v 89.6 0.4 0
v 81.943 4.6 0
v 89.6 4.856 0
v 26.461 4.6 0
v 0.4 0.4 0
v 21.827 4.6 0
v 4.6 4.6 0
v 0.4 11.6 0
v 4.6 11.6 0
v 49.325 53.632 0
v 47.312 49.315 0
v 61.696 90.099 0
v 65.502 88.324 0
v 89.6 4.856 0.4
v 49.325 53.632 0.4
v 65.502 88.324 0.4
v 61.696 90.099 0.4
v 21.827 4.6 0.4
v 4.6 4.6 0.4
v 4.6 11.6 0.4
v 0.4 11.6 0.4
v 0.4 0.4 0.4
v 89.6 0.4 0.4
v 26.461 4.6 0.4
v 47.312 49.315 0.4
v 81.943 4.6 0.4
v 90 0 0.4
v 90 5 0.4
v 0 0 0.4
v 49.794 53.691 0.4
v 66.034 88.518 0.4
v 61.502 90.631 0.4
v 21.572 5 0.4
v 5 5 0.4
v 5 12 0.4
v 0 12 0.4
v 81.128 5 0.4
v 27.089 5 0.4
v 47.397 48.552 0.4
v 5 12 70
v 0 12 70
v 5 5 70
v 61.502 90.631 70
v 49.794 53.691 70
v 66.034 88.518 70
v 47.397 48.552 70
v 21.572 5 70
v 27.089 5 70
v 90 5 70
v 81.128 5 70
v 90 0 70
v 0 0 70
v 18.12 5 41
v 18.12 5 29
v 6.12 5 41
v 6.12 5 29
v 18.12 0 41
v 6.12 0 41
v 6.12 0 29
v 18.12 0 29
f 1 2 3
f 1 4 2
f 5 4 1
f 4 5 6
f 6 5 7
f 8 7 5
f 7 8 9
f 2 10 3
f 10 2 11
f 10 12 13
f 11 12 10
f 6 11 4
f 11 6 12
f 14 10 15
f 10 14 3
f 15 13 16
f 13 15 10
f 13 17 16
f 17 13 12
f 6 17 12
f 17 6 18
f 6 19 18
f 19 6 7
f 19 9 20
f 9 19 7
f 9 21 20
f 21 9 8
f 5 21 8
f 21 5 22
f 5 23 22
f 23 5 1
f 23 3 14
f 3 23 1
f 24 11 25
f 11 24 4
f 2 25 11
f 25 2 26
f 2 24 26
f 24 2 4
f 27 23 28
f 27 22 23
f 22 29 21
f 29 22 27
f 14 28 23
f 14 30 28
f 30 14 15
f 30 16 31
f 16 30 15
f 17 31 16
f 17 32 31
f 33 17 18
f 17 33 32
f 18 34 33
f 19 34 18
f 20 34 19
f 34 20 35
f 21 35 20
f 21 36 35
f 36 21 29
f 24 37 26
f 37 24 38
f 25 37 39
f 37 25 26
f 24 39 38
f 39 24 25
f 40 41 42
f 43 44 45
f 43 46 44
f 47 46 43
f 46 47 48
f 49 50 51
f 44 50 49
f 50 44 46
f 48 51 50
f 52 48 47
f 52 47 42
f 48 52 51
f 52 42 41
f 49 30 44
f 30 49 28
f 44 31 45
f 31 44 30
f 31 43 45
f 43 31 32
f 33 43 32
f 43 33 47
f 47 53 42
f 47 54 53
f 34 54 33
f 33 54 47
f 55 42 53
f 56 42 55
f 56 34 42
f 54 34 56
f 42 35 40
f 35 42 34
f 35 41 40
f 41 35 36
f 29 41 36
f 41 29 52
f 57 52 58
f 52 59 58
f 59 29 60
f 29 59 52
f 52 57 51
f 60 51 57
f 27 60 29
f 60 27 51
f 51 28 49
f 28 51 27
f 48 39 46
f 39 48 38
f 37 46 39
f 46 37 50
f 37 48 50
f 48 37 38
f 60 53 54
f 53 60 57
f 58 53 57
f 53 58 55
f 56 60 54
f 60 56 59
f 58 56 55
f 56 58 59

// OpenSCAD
// @checkpoint parent= desc="Soporte de escritorio para teléfono con ranura de cable (plantilla)"
// Plantilla ScadLab: soporte inclinado para teléfono o tablet chica.
// Se imprime ACOSTADO (el perfil apoyado en la placa, ancho en Z): todas las
// piezas del perfil quedan en el plano de las capas y no hay voladizos.

/* [Teléfono] */
// Espesor del teléfono con funda
phone_t = 12;        // [6:0.5:20]
// Ángulo del respaldo respecto de la horizontal
angle = 65;          // [45:1:80]
seat_clear = 1;      // [0:0.5:4]

/* [Soporte] */
width = 70;          // [30:1:170]
thickness = 5;       // [3:0.5:10]
lip_h = 12;          // [5:1:30]
back_len = 100;      // [40:1:170]
base_depth = 90;     // [40:1:170]
// Ancho de la ranura para el cable de carga (0 = sin ranura)
cable_slot = 12;     // [0:1:25]

/* [Acabado] */
foot_inset = 0.4;    // [0:0.1:1]

/* [Colores] */
part_color = "#8D6E63";

/* [Hidden] */
PLATE = [180, 180, 180];   // A1 mini; ajustar según printer.json
eps = 0.01;
$fa = $preview ? 12 : 4;
$fs = $preview ? 2 : 0.4;

seat_w = phone_t / sin(angle) + seat_clear;      // ancho horizontal del asiento
x_back = thickness + seat_w;                     // pie de la cara frontal del respaldo
top_x = x_back + back_len * cos(angle) + thickness * sin(angle);
top_y = back_len * sin(angle);
brace_at = 0.6;                                  // fracción del respaldo donde apoya el puntal

assert(top_x <= base_depth, "base_depth debe cubrir la proyección del respaldo (si no, vuelca)");
assert(cable_slot == 0 || cable_slot < width - 2 * thickness, "cable_slot más ancho que el soporte");
assert(base_depth <= PLATE.x - 4 && top_y <= PLATE.y - 4 && width <= PLATE.z, str("No cabe en la placa ", PLATE));

// ---------- Ensamblado ----------
color(part_color) stand();

// ---------- Módulos ----------
module profile_2d() {
    intersection() {
        union() {
            square([base_depth, thickness]);                         // base
            square([thickness, lip_h]);                              // labio frontal
            // respaldo: la cara frontal pasa por (x_back, 0); el espesor queda detrás
            translate([x_back, 0]) rotate(angle) translate([0, -thickness]) square([back_len, thickness]);
            // puntal desde el respaldo al extremo de la base
            hull() {
                // punto en el eje del respaldo (medio espesor detrás de la cara frontal)
                translate([x_back + brace_at * back_len * cos(angle) + thickness / 2 * sin(angle),
                           brace_at * back_len * sin(angle) - thickness / 2 * cos(angle)])
                    circle(d = thickness);
                translate([base_depth - thickness, 0]) square([thickness, thickness]);
            }
        }
        translate([-1, 0]) square([base_depth + 2, top_y + thickness + 1]);   // recorta lo que cae bajo y = 0
    }
}

module foot_compensated_extrude(h, c) {
    if (c > 0) linear_extrude(height = c + eps) offset(delta = -c) children();
    translate([0, 0, c]) linear_extrude(height = h - c) children();
}

module stand() {
    difference() {
        foot_compensated_extrude(width, foot_inset) profile_2d();
        // ranura vertical bajo el asiento para el conector de carga
        if (cable_slot > 0)
            translate([thickness + seat_w / 2 - cable_slot / 2, -1, width / 2 - cable_slot / 2])
                cube([cable_slot, thickness + 2, cable_slot]);
    }
}
